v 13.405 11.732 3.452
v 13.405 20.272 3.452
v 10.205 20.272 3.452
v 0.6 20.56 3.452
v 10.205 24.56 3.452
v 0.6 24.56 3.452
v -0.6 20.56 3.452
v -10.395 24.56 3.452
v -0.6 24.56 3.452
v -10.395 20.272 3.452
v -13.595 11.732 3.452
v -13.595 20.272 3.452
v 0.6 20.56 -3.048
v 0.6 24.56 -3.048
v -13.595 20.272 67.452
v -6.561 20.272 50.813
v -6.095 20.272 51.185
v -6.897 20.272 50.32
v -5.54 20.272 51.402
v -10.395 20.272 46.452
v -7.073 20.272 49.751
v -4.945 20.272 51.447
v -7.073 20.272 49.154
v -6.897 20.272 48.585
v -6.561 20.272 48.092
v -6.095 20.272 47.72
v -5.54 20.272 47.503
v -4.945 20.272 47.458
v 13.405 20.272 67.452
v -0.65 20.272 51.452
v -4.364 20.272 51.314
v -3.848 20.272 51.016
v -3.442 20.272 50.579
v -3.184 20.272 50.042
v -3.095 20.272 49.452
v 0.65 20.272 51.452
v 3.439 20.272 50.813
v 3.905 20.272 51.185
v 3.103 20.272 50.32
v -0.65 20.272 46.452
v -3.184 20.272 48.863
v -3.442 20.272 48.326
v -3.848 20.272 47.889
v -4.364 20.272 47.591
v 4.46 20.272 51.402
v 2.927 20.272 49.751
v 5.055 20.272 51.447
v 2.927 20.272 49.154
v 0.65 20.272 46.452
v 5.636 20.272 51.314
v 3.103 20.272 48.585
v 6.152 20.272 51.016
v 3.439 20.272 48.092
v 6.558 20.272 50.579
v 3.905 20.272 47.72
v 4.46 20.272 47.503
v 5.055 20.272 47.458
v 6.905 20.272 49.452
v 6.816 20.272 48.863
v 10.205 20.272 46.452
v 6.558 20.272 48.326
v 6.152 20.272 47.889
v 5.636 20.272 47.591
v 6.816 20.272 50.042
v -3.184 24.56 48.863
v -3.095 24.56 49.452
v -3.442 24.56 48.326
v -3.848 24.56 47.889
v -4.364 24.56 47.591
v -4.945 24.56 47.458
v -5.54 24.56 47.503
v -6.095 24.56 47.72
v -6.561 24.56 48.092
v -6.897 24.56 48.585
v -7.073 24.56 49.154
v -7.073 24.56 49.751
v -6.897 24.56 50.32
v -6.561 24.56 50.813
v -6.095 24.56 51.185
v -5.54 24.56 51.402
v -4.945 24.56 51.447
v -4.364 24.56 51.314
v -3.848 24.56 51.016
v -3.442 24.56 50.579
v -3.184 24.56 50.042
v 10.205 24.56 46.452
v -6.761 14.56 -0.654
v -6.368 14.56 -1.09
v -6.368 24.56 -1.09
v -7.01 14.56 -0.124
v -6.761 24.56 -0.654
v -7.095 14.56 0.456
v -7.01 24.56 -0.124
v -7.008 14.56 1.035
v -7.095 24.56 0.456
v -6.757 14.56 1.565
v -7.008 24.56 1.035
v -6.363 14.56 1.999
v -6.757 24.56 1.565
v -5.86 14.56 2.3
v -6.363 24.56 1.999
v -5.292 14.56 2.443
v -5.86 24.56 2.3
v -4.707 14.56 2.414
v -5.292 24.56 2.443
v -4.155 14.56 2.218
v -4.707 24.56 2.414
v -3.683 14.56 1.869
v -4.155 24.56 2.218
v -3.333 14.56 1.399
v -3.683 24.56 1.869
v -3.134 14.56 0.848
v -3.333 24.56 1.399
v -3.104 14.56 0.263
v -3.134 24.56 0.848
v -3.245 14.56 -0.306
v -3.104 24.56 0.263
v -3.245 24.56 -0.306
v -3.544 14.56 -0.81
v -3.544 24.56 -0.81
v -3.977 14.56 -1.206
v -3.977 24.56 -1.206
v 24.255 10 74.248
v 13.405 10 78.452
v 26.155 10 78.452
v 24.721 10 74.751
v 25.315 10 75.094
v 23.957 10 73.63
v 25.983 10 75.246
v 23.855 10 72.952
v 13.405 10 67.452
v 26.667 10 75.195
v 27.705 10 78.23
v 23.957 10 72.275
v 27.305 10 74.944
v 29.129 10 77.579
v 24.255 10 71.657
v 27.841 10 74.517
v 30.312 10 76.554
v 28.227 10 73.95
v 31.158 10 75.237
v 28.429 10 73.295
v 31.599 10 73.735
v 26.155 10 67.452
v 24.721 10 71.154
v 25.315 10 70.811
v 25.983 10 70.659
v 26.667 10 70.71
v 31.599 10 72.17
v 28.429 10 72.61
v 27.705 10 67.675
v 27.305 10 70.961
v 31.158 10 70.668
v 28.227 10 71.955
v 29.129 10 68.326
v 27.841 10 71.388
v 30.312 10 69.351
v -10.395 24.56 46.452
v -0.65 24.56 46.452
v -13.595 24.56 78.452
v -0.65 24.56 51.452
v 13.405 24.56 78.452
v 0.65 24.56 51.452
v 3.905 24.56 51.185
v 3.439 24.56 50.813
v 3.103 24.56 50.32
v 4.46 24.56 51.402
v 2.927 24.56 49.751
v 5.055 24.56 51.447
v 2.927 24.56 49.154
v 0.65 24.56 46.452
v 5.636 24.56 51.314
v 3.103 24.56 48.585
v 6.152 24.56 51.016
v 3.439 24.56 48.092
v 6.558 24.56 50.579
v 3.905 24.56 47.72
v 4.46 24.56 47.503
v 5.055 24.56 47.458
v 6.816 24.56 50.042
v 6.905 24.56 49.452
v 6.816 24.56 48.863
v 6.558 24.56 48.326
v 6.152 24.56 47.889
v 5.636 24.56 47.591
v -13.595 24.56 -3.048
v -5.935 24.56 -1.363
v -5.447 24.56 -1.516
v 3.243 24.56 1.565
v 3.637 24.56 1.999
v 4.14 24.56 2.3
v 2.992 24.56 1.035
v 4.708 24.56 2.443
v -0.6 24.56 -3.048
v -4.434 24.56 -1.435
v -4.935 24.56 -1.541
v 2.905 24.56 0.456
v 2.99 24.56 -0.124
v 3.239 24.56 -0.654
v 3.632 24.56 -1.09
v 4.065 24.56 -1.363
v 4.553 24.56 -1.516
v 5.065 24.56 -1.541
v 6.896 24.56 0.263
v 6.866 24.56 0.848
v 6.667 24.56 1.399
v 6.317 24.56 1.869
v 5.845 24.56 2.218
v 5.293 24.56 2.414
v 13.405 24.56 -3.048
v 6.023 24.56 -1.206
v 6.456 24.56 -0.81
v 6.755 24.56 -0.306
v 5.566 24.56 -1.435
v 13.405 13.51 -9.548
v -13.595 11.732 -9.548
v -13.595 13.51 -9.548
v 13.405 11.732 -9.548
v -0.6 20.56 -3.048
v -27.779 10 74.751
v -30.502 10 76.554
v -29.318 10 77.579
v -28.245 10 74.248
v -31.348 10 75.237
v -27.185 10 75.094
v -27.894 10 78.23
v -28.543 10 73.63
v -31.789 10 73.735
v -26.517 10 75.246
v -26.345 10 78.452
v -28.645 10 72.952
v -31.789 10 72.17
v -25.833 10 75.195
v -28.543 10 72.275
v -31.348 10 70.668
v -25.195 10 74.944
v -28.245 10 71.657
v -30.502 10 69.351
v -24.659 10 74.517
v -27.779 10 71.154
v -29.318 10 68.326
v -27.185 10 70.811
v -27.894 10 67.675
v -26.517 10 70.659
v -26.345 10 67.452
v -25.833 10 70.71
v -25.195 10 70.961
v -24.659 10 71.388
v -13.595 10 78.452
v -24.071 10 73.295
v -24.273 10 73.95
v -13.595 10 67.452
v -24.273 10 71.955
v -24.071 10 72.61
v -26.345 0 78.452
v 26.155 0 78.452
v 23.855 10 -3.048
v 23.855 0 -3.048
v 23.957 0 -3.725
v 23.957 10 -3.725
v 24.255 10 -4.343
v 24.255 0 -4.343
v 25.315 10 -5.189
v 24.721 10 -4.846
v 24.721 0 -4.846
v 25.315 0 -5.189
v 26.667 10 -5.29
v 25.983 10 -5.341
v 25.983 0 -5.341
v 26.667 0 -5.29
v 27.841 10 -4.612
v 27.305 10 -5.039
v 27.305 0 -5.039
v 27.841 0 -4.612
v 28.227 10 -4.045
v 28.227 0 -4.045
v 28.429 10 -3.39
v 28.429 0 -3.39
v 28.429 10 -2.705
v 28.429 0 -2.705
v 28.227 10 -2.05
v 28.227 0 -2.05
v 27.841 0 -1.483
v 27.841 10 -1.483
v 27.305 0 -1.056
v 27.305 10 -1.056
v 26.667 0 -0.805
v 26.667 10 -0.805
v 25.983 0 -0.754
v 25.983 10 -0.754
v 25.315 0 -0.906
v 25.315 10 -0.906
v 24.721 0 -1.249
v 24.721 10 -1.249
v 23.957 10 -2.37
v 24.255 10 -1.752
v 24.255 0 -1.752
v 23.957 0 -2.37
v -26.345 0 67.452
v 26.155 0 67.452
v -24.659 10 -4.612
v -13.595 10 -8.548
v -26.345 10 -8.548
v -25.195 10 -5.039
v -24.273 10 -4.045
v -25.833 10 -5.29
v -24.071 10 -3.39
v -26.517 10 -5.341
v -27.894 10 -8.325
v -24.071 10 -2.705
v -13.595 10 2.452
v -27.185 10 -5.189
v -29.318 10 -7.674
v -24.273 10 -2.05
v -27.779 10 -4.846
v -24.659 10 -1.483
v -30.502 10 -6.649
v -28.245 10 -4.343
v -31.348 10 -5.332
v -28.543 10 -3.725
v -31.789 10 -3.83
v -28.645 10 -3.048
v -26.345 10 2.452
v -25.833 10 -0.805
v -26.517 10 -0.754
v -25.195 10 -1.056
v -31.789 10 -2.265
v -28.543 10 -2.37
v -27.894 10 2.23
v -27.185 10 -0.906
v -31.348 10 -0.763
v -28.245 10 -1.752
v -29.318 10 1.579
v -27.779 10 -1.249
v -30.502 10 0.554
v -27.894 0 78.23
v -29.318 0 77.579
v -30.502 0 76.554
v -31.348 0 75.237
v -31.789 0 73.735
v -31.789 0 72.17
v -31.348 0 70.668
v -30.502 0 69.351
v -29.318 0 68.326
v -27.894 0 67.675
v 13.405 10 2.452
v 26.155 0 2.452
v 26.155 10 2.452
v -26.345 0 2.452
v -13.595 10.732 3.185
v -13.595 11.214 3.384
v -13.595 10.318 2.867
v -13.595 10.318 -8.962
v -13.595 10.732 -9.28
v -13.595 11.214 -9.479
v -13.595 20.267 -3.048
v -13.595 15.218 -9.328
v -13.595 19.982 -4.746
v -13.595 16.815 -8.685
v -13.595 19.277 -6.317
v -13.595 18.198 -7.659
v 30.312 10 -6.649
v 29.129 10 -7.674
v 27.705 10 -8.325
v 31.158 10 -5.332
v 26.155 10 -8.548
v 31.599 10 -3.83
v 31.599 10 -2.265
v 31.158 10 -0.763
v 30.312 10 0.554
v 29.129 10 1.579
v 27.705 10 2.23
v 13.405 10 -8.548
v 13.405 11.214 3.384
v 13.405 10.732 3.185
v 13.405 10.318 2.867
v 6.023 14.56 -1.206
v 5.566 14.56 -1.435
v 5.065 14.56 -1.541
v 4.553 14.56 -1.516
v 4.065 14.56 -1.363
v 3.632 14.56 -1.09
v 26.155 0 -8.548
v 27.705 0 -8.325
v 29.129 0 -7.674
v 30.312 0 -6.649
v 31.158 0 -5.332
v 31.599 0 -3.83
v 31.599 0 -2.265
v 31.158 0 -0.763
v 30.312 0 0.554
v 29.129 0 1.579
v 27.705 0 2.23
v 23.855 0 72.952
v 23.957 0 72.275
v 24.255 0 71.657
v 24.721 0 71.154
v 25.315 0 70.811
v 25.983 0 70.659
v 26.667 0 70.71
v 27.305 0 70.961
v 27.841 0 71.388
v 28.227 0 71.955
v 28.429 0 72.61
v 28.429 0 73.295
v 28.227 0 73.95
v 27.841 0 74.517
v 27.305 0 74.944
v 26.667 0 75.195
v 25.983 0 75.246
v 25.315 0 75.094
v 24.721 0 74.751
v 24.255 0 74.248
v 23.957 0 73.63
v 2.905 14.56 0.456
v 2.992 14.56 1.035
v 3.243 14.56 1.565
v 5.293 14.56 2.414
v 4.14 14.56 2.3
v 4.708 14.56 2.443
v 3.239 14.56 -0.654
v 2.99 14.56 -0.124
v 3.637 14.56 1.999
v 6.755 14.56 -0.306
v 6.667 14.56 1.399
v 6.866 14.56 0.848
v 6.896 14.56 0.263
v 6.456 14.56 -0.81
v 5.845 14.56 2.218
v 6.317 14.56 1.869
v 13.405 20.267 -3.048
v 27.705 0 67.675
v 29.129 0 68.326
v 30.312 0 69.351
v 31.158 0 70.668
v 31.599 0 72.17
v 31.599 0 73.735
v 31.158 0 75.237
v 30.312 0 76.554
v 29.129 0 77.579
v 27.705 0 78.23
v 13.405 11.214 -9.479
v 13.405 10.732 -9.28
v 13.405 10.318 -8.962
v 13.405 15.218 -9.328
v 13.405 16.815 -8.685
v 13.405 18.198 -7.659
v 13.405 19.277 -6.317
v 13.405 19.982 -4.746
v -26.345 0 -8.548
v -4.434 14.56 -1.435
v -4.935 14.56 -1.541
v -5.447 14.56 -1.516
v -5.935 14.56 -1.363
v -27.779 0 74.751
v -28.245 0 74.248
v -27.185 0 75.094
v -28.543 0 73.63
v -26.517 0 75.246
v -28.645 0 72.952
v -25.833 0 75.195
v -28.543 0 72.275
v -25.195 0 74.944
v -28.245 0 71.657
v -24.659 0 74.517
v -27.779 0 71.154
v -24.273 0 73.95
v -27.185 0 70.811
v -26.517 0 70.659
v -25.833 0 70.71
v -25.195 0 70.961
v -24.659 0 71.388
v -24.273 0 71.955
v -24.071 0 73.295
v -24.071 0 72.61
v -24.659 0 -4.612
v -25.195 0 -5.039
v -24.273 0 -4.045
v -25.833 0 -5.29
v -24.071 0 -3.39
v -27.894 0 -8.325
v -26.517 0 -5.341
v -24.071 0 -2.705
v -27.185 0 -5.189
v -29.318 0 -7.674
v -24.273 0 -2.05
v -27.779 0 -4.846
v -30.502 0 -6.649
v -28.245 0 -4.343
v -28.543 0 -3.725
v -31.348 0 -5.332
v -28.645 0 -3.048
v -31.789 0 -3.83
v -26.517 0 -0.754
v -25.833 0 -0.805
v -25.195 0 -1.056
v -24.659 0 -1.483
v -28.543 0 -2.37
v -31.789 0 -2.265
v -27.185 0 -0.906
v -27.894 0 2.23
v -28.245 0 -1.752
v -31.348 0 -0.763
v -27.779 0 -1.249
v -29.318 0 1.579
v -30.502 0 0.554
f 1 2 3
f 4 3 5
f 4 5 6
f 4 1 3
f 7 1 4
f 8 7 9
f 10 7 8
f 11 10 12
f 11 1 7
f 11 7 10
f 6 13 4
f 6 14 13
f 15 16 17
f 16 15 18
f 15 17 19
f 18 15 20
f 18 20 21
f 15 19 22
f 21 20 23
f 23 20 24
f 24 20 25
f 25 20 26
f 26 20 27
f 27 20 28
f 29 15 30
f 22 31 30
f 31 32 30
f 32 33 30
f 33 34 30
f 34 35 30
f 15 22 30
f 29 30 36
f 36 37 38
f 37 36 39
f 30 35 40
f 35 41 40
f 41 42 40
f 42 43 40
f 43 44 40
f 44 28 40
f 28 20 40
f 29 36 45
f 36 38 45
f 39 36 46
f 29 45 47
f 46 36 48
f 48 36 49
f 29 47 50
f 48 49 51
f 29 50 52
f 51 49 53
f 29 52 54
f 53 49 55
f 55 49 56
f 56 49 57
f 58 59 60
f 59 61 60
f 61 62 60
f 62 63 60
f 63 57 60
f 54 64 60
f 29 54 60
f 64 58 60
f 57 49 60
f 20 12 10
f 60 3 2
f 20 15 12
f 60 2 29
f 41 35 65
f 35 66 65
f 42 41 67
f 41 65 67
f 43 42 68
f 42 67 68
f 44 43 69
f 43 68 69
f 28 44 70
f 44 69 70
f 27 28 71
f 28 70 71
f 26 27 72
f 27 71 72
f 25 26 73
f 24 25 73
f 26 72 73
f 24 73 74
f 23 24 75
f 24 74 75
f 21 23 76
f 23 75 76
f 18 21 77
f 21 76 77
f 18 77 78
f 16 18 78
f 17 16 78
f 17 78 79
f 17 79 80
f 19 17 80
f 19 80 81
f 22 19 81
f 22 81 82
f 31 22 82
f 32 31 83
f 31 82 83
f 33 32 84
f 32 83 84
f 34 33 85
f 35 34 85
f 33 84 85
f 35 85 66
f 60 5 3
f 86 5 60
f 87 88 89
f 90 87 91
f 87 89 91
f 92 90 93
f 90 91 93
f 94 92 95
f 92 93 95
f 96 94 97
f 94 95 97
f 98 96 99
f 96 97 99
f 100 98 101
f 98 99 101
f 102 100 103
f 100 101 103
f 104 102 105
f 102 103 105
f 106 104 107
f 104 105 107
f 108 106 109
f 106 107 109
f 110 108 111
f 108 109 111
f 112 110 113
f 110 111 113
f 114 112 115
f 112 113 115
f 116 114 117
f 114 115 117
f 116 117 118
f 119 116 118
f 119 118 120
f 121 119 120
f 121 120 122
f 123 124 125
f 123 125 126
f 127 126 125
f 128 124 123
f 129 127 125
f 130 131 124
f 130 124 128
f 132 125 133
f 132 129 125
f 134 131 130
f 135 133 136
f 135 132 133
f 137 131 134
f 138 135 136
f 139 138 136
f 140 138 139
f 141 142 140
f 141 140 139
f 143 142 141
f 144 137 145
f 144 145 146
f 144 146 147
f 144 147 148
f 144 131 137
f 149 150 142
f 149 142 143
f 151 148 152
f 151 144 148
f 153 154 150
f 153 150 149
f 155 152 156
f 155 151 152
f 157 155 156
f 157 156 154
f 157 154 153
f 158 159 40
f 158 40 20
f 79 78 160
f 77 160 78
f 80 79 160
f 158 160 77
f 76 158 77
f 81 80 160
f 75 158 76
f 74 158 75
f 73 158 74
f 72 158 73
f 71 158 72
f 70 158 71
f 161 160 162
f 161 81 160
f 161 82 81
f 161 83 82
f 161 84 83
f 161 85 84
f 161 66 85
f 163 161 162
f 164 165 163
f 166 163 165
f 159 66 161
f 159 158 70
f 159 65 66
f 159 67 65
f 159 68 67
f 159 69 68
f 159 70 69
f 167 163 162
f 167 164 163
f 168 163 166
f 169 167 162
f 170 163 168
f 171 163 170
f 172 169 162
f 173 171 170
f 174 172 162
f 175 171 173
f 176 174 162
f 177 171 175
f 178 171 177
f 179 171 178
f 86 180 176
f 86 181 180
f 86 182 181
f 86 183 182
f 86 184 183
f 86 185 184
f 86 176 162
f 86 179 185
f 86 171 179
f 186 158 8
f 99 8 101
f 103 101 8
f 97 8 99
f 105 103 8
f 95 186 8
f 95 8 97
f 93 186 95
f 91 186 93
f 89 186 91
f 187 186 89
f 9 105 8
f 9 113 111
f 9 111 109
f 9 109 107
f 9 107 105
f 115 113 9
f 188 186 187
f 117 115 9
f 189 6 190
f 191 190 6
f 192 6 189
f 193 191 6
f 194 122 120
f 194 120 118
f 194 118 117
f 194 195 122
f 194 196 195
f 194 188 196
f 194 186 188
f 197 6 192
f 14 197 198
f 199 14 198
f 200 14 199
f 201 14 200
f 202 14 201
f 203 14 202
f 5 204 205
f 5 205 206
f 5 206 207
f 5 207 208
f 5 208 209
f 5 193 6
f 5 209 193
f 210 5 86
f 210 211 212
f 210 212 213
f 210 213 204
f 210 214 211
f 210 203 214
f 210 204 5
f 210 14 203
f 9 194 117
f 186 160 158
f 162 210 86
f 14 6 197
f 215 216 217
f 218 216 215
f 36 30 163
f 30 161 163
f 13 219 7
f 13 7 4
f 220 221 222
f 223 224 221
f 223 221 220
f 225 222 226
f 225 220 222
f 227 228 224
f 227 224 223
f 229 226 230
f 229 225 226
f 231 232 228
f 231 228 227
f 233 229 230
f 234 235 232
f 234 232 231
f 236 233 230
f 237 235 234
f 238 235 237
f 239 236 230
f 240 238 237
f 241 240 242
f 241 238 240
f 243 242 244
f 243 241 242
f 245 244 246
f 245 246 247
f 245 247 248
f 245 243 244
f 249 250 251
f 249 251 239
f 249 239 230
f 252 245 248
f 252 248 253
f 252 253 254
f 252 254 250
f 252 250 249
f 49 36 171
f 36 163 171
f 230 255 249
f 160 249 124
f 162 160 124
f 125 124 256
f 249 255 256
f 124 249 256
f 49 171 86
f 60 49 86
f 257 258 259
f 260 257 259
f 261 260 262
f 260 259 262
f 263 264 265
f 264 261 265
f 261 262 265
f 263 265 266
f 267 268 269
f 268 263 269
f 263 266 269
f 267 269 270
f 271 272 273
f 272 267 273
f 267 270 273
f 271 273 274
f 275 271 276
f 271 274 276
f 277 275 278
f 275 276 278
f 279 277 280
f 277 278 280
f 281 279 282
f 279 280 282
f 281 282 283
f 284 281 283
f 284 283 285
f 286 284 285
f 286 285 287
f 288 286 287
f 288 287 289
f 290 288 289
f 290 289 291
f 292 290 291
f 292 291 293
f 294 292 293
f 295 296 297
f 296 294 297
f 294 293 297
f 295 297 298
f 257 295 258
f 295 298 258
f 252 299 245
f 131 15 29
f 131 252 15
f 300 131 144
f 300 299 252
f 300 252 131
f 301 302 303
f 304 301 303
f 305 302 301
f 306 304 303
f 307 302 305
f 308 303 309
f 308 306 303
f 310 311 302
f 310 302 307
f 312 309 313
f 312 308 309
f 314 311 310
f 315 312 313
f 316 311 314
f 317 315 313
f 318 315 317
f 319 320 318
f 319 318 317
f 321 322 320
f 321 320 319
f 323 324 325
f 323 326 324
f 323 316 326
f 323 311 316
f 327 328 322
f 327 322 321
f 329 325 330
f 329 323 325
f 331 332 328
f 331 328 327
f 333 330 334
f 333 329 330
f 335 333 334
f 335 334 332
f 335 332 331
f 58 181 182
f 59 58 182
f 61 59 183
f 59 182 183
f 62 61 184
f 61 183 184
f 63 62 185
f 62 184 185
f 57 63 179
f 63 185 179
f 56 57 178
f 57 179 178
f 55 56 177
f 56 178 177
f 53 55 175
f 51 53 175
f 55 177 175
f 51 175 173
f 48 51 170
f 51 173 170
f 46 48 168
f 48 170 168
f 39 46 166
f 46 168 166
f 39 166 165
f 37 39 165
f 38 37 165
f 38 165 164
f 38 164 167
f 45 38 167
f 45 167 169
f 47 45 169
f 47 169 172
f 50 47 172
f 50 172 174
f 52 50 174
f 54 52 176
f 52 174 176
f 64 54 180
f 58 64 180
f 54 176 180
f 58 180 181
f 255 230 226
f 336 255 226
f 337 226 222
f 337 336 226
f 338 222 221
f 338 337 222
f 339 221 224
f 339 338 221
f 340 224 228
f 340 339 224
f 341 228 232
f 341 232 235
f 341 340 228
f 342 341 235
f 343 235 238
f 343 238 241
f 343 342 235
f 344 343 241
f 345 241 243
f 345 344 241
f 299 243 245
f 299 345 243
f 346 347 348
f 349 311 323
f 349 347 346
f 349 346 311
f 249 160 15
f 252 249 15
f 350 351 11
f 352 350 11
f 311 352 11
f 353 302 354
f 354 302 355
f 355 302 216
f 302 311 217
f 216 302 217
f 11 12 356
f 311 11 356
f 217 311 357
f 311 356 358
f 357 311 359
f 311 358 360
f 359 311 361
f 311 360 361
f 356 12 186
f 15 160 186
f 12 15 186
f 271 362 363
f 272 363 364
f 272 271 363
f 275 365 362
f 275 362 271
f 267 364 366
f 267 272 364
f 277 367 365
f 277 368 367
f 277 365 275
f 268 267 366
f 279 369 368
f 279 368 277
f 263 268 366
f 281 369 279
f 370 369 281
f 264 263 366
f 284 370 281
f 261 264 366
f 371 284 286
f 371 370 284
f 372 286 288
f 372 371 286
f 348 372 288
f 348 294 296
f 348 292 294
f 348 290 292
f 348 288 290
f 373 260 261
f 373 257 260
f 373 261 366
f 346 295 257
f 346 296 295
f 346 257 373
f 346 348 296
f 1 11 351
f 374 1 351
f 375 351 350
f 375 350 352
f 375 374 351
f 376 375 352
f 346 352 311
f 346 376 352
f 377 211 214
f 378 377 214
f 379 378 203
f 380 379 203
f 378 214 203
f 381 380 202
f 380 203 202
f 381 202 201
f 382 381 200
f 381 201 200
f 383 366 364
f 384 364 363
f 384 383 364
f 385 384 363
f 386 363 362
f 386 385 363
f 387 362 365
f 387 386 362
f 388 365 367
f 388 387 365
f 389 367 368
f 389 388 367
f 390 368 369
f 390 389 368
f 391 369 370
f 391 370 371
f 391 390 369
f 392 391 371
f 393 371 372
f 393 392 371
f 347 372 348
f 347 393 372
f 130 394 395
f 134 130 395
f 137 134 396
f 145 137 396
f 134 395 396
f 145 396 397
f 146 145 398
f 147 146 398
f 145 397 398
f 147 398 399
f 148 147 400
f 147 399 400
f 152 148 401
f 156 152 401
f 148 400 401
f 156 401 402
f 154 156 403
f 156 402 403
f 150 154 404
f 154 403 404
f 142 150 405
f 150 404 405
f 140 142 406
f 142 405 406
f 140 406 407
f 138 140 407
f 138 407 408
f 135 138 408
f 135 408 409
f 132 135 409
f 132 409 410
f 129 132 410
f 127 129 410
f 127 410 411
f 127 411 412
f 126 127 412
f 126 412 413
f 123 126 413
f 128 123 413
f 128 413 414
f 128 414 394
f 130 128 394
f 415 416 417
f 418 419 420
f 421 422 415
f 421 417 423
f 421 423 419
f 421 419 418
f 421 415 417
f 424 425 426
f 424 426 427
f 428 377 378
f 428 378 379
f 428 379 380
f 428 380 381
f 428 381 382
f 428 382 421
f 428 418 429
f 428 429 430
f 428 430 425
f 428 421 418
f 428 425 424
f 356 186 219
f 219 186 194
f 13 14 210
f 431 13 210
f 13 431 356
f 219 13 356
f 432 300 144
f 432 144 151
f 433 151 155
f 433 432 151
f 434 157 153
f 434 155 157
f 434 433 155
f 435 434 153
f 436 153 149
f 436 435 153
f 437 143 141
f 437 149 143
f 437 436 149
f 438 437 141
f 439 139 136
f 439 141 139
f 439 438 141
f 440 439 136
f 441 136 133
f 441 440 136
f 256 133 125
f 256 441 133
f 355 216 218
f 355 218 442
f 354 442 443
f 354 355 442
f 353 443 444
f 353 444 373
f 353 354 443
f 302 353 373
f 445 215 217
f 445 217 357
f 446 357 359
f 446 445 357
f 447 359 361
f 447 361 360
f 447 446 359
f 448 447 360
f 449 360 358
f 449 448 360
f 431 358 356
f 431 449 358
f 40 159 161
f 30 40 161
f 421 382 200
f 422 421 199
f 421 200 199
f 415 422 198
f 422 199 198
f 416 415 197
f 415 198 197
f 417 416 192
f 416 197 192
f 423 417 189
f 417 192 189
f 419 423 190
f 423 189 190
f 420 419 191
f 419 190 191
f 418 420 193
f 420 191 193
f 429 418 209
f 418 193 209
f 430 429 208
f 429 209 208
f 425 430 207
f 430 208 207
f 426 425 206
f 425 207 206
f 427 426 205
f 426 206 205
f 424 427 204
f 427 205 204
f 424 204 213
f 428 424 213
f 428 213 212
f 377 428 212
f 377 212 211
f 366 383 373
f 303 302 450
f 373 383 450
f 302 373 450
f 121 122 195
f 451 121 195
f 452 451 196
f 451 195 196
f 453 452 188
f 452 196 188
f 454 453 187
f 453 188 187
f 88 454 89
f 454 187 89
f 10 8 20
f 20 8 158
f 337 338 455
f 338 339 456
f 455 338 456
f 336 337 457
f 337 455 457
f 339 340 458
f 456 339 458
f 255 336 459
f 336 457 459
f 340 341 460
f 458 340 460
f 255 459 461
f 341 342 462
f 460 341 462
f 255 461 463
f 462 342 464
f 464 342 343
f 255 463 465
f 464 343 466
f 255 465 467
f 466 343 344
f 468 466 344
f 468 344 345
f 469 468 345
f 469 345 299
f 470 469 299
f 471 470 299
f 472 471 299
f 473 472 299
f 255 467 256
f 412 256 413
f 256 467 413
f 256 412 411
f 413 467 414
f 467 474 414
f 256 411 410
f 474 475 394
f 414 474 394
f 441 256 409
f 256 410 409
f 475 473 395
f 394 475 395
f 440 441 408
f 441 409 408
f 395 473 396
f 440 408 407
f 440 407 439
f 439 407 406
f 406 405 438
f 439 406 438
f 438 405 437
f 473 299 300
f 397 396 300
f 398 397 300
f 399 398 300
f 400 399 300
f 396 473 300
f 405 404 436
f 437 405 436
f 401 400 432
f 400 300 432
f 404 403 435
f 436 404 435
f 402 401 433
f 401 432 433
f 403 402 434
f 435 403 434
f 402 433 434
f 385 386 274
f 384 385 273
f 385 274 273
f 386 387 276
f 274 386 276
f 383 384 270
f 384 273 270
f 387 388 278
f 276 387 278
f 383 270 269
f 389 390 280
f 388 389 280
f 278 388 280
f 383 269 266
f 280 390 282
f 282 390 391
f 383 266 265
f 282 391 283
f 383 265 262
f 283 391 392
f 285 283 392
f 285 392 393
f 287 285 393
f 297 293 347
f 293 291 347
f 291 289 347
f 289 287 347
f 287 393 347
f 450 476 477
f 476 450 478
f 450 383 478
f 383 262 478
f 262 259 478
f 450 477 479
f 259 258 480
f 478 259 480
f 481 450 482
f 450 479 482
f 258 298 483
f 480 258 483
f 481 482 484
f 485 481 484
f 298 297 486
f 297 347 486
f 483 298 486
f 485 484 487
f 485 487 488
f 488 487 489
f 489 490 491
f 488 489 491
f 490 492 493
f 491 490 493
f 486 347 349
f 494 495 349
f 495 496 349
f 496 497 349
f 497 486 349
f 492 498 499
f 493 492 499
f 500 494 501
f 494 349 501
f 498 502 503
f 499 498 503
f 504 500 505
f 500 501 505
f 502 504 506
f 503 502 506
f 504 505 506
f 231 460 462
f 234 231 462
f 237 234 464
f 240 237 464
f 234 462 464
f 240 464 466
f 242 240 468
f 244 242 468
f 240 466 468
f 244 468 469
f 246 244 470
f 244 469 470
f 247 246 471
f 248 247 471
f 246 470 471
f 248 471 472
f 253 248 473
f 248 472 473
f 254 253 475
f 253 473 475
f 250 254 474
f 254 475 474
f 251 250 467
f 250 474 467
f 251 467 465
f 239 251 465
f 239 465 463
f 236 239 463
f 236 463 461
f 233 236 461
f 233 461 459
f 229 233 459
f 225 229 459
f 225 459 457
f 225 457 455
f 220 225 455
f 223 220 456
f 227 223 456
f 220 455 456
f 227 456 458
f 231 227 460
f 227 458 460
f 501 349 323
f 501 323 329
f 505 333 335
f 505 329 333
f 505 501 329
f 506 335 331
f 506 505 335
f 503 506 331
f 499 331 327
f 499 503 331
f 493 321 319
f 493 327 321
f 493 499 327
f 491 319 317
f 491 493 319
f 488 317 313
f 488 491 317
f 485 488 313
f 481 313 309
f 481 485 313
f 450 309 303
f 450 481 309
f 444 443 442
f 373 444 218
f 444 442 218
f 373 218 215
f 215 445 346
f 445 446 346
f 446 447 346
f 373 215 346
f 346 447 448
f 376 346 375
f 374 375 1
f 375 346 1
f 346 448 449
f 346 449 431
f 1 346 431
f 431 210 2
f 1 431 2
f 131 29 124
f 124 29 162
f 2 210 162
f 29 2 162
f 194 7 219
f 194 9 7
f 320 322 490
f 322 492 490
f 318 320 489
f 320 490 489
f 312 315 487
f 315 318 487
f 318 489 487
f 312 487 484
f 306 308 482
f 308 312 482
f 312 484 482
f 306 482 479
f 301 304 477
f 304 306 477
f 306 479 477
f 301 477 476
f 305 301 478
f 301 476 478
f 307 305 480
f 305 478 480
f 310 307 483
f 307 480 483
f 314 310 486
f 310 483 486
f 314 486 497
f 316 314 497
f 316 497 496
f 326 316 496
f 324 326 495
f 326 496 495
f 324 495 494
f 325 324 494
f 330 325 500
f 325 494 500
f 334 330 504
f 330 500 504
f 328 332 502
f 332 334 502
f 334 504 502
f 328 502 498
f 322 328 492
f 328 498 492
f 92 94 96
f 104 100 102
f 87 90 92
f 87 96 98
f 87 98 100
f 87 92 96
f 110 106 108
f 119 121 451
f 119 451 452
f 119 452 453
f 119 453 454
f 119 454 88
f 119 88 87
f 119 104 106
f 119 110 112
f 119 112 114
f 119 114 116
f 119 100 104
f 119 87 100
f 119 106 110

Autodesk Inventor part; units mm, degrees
ref_plane "YZ Plane" through (0, 0, 0) normal (1, 0, 0) x (0, 1, 0)
ref_plane "XZ Plane" through (0, 0, 0) normal (0, 1, 0) x (-1, 0, 0)
ref_plane "XY Plane" through (0, 0, 0) normal (0, 0, 1) x (1, 0, 0)
sketch "Sketch1" plane through (0, 0, 0) normal (0, 1, 0) x (-1, 0, 0)
  circle A0 centre (-26.1551, -3.0475) radius 2.3
  arc A1 (-34.9051, -0.0475) -> (-17.4051, -0.0475) centre (-26.1551, -0.0475) ccw
  arc A2 (17.5949, -0.0475) -> (35.0949, -0.0475) centre (26.3449, -0.0475) ccw
  circle A3 centre (26.3449, -3.0475) radius 2.3
  circle A4 centre (-26.1551, -3.0475) radius 2.3
  circle A5 centre (26.3449, -3.0475) radius 2.3
  circle A6 centre (26.3449, -0.0475) radius 8.75
  circle A7 centre (-26.1551, -0.0475) radius 8.75
  line L0 (-34.9051, -0.0475) -> (-17.4051, -0.0475)
  line L1 (17.5949, -0.0475) -> (35.0949, -0.0475)
  circle A8 centre (-26.1551, -3.0475) radius 5.5
  circle A9 centre (26.3449, -3.0475) radius 5.5
  line L2 (-26.1551, -8.5475) -> (26.3449, -8.5475)
  line L3 (-26.1551, 2.4525) -> (26.3449, 2.4525)
  point P0 (0, 0)
  dimension "d0" = 11
  dimension "d1" = 11
  dimension "d41" = 4.6
  dimension "d42" = 4.6
extrude "Extrusion1" add sketch "Sketch1" along normal blind 10 contours L2 A8 L0 A1 | A1 A7 L3 A6 A2 L2 | A7 L0 A8 L3 | A8 L0 | L0 A8 | A2 L1 A9 L2 | L3 A9 L1 A6 | A9 L1 | A9 L1 picked at (-18.6939, -1.0014) picked at (-20.5799, 1.133) picked at (18.8536, -1.0809) picked at (20.7697, 1.133)
sketch "Sketch2" plane through (0, 10, 0) normal (0, 1, 0) x (1, 0, 0)
  line L0 (26.1551, 8.5475) -> (-26.3449, 8.5475) projected
  line L1 (-26.3449, -2.4525) -> (26.1551, -2.4525) projected
  arc A0 (-26.3449, 8.5475) -> (-26.3449, -2.4525) centre (-26.3449, 3.0475) ccw projected
  arc A1 (26.1551, -2.4525) -> (26.1551, 8.5475) centre (26.1551, 3.0475) ccw projected
  line L2 (-31.8449, 3.0475) -> (31.6551, 3.0475)
  line L3 (13.4051, -3.4525) -> (-13.5949, -3.4525)
  line L4 (-13.5949, -3.4525) -> (-13.5949, 9.5475)
  line L5 (-13.5949, 9.5475) -> (13.4051, 9.5475)
  line L6 (13.4051, 9.5475) -> (13.4051, -3.4525)
  line L7 (13.4051, -3.4525) -> (-13.5949, 9.5475) construction
  line L8 (-13.5949, -3.4525) -> (13.4051, 9.5475) construction
  point P0 (0, 0)
  point P1 (-0.0949, 3.0475)
  dimension "d4" = 27
  dimension "d5" = 13
extrude "Extrusion2" add sketch "Sketch2" along normal blind 14.56 contours L6 L2 L4 L0 | L0 L4 L5 L6 | L6 L1 L4 L2 | L6 L3 L4 L1
fillet "Fillet1" radius 2 2 edges at (-0.0949, 10, 3.4525) (-0.0949, 10, -9.5475)
sketch "Sketch3" plane through (0, 24.56, 0) normal (0, 1, 0) x (1, 0, 0)
  arc A0 (-6.3682, 1.0898) -> (-3.9766, 1.2056) centre (-5.0949, -0.4525) ccw
  arc A1 (3.6318, 1.0898) -> (6.0234, 1.2056) centre (4.9051, -0.4525) ccw
  circle A2 centre (4.9051, -0.4525) radius 2
  circle A3 centre (-5.0949, -0.4525) radius 2
  line L0 (-13.5949, 9.5475) -> (-13.5949, -3.4525) projected
  line L1 (13.4051, 9.5475) -> (-13.5949, 9.5475) projected
  line L2 (-13.5949, -3.4525) -> (13.4051, -3.4525) projected
  line L3 (13.4051, -3.4525) -> (13.4051, 9.5475) projected
  point P0 (0, 0)
  point P1 (6.0234, 1.2056)
  point P2 (3.6318, 1.0898)
  point P3 (-3.9766, 1.2056)
  point P4 (-6.3682, 1.0898)
  dimension "d12" = 8.5
  dimension "d13" = 8.5
  dimension "d43" = 2
  dimension "d44" = 2
extrude "Extrusion3" cut sketch "Sketch3" against normal blind 10 contours A3 A0 | A2 A1
sketch "Sketch4" plane through (0, 24.56, 0) normal (0, 1, 0) x (1, 0, 0)
  line L0 (13.4051, 9.5475) -> (-13.5949, 9.5475) projected
  line L1 (-13.5949, -2.4525) -> (-13.5949, 8.5475) projected
  line L2 (13.4051, 9.5475) -> (-13.5949, 9.5475)
  line L3 (-13.5949, 9.5475) -> (-13.5949, 3.0475)
  line L4 (-13.5949, 3.0475) -> (13.4051, 3.0475)
  line L5 (13.4051, 3.0475) -> (13.4051, 9.5475)
  point P0 (0, 0)
extrude "Extrusion4" cut sketch "Sketch4" against normal blind 4.2875
fillet "Fillet2" radius 6.7625 1 edges at (-0.0949, 20.2725, -9.5475)
sketch "Sketch5" plane through (0, 24.56, 0) normal (0, 1, 0) x (1, 0, 0)
  line L0 (-13.5949, -3.4525) -> (13.4051, -3.4525) projected
  line L1 (-10.3949, -3.4525) -> (-10.3949, -67.4525)
  line L2 (10.2051, -3.4525) -> (10.2051, -67.4525)
  line L3 (-13.5949, 3.0475) -> (-13.5949, -3.4525) projected
  circle A0 centre (-5.0949, -49.4525) radius 2
  line L4 (13.4051, -3.4525) -> (13.4051, 3.0475) projected
  circle A1 centre (4.9051, -49.4525) radius 2
  circle A2 centre (4.9051, -49.4525) radius 3
  circle A3 centre (-5.0949, -49.4525) radius 3
  line L5 (-10.3949, -67.4525) -> (10.2051, -67.4525)
  line L6 (-10.3949, -67.4525) -> (-13.5949, -67.4525)
  line L7 (-13.5949, -67.4525) -> (-13.5949, -3.4525)
  line L8 (10.2051, -67.4525) -> (13.4051, -67.4525)
  line L9 (13.4051, -67.4525) -> (13.4051, -3.4525)
  line L10 (-5.0949, -46.4525) -> (4.9051, -46.4525)
  line L11 (10.2051, -46.4525) -> (-10.3949, -46.4525)
  line L12 (-0.65, -46.4525) -> (-0.65, -51.4525)
  line L13 (-0.65, -51.4525) -> (0.65, -51.4525)
  line L14 (0.65, -51.4525) -> (0.65, -46.4525)
  line L15 (0, -46.4525) -> (-0.65, -51.4525) construction
  line L16 (0, -46.4525) -> (0.65, -51.4525) construction
  point P0 (0, 0)
  point P1 (13.4051, -0.2025)
  point P2 (4.9051, -46.4525)
  dimension "d28" = 6
  dimension "d29" = 6
  dimension "d19" = 3.2
  dimension "d20" = 64
  dimension "d21" = 3.2
  dimension "d22" = 64
  dimension "d23" = 46
  dimension "d24" = 8.5
  dimension "d25" = 4
  dimension "d26" = 8.5
  dimension "d27" = 4
  dimension "d30" = 1.3
extrude "Extrusion5" add sketch "Sketch5" against normal blind 4.2875 contours L0 L1 L6 L7 | L0 L9 L8 L2 | A2 | A3 | L11 L10 L12 L13 L14 L2 L5 L1
sketch "Sketch6" plane through (0, 24.56, 0) normal (0, 1, 0) x (1, 0, 0)
  line L0 (13.4051, -67.4525) -> (-13.5949, -67.4525) projected
  line L1 (-13.5949, -67.4525) -> (13.4051, -67.4525)
  line L2 (13.4051, -67.4525) -> (13.4051, -78.4525)
  line L3 (13.4051, -78.4525) -> (-13.5949, -78.4525)
  line L4 (-13.5949, -78.4525) -> (-13.5949, -67.4525)
  circle A0 centre (26.1551, 3.0475) radius 2.3 projected
  circle A1 centre (-26.3449, 3.0475) radius 2.3 projected
  point P0 (0, 0)
  dimension "d34" = 11
extrude "Extrusion6" add sketch "Sketch6" against normal up to surface (14.56 mm away) contours L2 L3 L4 L0
ref_plane "Work Plane1" through (-13.5949, 24.56, 34.9525) normal (0, 0, 1) x (1, 0, 0)
sketch "Sketch7" plane through (0, 24.56, 0) normal (0, 1, 0) x (1, 0, 0)
  point P0 (0, 0)
mirror "Mirror1" about plane through (-13.5949, 24.56, 34.9525) normal (0, 0, 1) of "Extrusion1"
sketch "Sketch8" plane through (0, 24.56, 0) normal (0, 1, 0) x (1, 0, 0)
  line L0 (0.6, -3.9565) -> (-0.6, -3.9565)
  line L1 (-0.6, -3.9565) -> (-0.6, 3.9565)
  line L2 (-0.6, 3.9565) -> (0.6, 3.9565)
  line L3 (0.6, 3.9565) -> (0.6, -3.9565)
  line L4 (0.6, -3.9565) -> (-0.6, 3.9565) construction
  line L5 (-0.6, -3.9565) -> (0.6, 3.9565) construction
  point P0 (0, 0)
  dimension "d38" = 1.2
extrude "Extrusion7" cut sketch "Sketch8" against normal blind 4
properties part number "SERVO_MOUNT_TOBASE"
